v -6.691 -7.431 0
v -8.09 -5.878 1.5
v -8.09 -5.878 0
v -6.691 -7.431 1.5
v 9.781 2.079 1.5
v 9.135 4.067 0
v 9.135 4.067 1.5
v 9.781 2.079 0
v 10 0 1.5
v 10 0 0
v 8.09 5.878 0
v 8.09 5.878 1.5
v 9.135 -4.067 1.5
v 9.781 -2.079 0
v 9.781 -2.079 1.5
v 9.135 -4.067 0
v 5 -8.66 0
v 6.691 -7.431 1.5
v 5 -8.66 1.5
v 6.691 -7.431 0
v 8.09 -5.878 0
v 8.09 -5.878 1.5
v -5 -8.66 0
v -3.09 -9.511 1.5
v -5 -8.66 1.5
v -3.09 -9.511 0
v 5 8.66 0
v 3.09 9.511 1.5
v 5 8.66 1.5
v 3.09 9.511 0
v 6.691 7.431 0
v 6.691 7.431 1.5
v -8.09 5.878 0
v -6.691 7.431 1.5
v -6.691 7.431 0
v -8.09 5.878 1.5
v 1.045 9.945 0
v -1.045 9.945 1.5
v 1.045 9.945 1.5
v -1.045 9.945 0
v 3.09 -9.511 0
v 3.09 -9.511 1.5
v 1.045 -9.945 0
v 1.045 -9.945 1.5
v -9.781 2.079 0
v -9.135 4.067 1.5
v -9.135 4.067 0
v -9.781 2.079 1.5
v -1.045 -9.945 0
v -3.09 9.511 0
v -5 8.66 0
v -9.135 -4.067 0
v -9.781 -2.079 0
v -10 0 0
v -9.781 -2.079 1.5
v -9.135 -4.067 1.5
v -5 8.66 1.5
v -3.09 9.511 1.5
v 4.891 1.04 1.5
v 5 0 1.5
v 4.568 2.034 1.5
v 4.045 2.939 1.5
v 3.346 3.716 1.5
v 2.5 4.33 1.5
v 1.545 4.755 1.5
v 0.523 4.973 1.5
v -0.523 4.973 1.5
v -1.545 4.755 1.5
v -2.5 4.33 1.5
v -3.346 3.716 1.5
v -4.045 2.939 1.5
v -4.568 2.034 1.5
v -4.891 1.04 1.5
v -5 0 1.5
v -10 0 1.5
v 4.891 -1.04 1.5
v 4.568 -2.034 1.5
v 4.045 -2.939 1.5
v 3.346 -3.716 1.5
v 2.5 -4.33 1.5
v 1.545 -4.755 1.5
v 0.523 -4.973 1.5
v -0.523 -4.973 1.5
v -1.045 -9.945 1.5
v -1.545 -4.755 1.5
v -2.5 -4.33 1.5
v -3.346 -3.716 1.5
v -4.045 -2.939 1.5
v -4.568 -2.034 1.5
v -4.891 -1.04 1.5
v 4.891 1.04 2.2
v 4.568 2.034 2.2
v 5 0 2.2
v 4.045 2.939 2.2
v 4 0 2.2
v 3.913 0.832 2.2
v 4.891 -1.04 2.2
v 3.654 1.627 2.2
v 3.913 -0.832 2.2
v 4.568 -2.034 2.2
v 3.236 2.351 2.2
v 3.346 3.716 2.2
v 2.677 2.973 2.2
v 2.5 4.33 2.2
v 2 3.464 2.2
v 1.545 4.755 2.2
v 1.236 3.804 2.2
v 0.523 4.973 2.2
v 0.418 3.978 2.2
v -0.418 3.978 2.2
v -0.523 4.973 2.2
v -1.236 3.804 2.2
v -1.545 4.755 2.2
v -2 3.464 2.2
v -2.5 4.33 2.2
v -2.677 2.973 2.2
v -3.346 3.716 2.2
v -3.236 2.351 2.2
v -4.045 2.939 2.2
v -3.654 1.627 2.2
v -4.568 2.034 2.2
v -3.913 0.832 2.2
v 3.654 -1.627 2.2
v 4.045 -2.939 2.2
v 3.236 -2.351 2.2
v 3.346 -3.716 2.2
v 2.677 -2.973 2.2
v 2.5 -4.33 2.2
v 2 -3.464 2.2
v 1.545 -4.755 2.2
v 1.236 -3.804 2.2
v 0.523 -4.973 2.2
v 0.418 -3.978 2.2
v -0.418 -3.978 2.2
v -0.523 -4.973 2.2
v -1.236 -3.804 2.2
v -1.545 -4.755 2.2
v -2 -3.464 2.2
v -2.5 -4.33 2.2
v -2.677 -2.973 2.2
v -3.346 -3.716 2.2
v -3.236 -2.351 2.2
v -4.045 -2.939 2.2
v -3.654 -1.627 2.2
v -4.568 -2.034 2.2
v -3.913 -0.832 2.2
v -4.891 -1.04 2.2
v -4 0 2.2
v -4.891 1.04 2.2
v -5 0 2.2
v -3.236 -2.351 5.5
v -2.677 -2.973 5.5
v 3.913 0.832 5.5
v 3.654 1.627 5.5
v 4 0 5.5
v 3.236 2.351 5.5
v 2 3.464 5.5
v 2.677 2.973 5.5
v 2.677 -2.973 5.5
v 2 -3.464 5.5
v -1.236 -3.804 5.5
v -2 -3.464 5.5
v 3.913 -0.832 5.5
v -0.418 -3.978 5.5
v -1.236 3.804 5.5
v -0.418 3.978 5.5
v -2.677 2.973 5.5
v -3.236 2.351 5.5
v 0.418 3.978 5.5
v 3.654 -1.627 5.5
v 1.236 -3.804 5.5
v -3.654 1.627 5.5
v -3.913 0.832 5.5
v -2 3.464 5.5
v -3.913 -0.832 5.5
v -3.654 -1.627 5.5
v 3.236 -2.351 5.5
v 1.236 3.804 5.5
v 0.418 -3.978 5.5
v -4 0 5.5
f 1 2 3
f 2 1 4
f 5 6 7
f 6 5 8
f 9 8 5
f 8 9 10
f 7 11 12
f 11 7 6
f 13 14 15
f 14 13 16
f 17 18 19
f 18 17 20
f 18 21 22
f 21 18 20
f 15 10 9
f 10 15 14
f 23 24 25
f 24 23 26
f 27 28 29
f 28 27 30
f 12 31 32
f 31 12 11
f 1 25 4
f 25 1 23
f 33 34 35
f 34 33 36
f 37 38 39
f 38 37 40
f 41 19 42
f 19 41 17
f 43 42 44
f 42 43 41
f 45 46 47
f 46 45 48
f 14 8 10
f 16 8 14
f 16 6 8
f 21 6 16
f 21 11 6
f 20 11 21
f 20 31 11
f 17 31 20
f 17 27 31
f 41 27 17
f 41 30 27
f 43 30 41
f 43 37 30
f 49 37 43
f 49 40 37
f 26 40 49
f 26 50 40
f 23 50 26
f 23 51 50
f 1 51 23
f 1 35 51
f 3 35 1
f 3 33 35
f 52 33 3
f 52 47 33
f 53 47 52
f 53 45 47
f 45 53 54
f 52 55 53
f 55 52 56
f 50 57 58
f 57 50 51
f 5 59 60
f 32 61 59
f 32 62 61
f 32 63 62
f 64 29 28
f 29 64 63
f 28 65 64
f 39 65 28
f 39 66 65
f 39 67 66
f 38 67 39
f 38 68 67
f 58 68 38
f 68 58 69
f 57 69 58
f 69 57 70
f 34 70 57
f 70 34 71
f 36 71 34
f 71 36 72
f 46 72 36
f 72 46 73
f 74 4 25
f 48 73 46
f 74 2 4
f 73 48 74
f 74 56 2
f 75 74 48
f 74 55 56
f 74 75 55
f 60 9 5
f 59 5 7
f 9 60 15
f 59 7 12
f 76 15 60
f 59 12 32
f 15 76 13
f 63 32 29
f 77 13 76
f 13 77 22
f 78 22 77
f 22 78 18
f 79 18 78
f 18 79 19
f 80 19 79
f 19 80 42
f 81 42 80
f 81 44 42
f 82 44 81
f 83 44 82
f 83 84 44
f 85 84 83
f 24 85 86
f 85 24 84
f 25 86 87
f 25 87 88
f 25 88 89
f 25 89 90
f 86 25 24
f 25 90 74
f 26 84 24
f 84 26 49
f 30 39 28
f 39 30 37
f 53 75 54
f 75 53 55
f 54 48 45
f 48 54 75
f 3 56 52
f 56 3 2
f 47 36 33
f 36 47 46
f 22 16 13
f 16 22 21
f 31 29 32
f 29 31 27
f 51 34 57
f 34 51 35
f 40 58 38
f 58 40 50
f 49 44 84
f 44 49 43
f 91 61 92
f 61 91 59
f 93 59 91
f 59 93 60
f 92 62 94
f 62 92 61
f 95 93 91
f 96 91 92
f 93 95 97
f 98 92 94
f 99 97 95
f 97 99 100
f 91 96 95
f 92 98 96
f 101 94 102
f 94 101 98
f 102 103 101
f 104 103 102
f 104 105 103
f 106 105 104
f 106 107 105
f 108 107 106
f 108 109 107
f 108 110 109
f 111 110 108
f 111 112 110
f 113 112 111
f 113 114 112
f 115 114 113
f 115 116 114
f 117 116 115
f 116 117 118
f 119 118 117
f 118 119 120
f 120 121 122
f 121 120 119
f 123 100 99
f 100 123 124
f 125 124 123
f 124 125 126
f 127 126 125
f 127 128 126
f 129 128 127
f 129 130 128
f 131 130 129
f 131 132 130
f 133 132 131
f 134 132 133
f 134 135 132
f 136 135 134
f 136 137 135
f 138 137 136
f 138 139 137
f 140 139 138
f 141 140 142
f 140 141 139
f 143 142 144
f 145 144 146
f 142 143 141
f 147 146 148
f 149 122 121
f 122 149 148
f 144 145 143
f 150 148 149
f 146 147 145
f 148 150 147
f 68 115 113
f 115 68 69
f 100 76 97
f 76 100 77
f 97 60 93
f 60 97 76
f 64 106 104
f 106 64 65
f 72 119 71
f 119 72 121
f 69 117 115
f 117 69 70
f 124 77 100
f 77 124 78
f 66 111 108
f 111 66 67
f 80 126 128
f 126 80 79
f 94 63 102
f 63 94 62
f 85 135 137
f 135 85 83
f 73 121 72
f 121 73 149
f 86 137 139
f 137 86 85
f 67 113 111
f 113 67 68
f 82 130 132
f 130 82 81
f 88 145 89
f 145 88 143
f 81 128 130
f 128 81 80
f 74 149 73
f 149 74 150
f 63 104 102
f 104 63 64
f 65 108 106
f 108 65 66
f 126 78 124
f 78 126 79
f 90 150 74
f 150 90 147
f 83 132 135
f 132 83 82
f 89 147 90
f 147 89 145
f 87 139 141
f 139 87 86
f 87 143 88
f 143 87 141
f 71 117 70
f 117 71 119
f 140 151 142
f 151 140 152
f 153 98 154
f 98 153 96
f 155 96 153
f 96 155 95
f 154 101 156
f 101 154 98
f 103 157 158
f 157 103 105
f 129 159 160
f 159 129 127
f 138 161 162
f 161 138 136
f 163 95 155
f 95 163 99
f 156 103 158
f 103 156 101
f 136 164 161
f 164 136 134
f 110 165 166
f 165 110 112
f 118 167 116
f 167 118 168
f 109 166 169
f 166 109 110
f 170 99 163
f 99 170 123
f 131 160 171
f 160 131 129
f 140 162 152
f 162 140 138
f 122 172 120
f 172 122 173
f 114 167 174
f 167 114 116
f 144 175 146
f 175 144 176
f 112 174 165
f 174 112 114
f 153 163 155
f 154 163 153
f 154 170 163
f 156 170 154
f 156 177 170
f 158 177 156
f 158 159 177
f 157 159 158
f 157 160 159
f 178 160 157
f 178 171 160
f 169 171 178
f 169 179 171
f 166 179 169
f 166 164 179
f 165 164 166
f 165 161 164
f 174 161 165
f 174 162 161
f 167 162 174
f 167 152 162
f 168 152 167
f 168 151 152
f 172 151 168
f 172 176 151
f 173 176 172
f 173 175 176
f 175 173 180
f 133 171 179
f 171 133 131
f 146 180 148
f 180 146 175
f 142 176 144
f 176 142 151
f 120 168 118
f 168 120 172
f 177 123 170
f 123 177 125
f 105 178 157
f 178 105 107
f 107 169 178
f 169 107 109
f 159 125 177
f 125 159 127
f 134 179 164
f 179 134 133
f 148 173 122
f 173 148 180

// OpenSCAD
$fn = 30;
cylinder(1.5,d=20,[0,0,0]);
cylinder(2.2,d=10,[0,0,0]);
cylinder(5.5,d=8,[0,0,0]);
